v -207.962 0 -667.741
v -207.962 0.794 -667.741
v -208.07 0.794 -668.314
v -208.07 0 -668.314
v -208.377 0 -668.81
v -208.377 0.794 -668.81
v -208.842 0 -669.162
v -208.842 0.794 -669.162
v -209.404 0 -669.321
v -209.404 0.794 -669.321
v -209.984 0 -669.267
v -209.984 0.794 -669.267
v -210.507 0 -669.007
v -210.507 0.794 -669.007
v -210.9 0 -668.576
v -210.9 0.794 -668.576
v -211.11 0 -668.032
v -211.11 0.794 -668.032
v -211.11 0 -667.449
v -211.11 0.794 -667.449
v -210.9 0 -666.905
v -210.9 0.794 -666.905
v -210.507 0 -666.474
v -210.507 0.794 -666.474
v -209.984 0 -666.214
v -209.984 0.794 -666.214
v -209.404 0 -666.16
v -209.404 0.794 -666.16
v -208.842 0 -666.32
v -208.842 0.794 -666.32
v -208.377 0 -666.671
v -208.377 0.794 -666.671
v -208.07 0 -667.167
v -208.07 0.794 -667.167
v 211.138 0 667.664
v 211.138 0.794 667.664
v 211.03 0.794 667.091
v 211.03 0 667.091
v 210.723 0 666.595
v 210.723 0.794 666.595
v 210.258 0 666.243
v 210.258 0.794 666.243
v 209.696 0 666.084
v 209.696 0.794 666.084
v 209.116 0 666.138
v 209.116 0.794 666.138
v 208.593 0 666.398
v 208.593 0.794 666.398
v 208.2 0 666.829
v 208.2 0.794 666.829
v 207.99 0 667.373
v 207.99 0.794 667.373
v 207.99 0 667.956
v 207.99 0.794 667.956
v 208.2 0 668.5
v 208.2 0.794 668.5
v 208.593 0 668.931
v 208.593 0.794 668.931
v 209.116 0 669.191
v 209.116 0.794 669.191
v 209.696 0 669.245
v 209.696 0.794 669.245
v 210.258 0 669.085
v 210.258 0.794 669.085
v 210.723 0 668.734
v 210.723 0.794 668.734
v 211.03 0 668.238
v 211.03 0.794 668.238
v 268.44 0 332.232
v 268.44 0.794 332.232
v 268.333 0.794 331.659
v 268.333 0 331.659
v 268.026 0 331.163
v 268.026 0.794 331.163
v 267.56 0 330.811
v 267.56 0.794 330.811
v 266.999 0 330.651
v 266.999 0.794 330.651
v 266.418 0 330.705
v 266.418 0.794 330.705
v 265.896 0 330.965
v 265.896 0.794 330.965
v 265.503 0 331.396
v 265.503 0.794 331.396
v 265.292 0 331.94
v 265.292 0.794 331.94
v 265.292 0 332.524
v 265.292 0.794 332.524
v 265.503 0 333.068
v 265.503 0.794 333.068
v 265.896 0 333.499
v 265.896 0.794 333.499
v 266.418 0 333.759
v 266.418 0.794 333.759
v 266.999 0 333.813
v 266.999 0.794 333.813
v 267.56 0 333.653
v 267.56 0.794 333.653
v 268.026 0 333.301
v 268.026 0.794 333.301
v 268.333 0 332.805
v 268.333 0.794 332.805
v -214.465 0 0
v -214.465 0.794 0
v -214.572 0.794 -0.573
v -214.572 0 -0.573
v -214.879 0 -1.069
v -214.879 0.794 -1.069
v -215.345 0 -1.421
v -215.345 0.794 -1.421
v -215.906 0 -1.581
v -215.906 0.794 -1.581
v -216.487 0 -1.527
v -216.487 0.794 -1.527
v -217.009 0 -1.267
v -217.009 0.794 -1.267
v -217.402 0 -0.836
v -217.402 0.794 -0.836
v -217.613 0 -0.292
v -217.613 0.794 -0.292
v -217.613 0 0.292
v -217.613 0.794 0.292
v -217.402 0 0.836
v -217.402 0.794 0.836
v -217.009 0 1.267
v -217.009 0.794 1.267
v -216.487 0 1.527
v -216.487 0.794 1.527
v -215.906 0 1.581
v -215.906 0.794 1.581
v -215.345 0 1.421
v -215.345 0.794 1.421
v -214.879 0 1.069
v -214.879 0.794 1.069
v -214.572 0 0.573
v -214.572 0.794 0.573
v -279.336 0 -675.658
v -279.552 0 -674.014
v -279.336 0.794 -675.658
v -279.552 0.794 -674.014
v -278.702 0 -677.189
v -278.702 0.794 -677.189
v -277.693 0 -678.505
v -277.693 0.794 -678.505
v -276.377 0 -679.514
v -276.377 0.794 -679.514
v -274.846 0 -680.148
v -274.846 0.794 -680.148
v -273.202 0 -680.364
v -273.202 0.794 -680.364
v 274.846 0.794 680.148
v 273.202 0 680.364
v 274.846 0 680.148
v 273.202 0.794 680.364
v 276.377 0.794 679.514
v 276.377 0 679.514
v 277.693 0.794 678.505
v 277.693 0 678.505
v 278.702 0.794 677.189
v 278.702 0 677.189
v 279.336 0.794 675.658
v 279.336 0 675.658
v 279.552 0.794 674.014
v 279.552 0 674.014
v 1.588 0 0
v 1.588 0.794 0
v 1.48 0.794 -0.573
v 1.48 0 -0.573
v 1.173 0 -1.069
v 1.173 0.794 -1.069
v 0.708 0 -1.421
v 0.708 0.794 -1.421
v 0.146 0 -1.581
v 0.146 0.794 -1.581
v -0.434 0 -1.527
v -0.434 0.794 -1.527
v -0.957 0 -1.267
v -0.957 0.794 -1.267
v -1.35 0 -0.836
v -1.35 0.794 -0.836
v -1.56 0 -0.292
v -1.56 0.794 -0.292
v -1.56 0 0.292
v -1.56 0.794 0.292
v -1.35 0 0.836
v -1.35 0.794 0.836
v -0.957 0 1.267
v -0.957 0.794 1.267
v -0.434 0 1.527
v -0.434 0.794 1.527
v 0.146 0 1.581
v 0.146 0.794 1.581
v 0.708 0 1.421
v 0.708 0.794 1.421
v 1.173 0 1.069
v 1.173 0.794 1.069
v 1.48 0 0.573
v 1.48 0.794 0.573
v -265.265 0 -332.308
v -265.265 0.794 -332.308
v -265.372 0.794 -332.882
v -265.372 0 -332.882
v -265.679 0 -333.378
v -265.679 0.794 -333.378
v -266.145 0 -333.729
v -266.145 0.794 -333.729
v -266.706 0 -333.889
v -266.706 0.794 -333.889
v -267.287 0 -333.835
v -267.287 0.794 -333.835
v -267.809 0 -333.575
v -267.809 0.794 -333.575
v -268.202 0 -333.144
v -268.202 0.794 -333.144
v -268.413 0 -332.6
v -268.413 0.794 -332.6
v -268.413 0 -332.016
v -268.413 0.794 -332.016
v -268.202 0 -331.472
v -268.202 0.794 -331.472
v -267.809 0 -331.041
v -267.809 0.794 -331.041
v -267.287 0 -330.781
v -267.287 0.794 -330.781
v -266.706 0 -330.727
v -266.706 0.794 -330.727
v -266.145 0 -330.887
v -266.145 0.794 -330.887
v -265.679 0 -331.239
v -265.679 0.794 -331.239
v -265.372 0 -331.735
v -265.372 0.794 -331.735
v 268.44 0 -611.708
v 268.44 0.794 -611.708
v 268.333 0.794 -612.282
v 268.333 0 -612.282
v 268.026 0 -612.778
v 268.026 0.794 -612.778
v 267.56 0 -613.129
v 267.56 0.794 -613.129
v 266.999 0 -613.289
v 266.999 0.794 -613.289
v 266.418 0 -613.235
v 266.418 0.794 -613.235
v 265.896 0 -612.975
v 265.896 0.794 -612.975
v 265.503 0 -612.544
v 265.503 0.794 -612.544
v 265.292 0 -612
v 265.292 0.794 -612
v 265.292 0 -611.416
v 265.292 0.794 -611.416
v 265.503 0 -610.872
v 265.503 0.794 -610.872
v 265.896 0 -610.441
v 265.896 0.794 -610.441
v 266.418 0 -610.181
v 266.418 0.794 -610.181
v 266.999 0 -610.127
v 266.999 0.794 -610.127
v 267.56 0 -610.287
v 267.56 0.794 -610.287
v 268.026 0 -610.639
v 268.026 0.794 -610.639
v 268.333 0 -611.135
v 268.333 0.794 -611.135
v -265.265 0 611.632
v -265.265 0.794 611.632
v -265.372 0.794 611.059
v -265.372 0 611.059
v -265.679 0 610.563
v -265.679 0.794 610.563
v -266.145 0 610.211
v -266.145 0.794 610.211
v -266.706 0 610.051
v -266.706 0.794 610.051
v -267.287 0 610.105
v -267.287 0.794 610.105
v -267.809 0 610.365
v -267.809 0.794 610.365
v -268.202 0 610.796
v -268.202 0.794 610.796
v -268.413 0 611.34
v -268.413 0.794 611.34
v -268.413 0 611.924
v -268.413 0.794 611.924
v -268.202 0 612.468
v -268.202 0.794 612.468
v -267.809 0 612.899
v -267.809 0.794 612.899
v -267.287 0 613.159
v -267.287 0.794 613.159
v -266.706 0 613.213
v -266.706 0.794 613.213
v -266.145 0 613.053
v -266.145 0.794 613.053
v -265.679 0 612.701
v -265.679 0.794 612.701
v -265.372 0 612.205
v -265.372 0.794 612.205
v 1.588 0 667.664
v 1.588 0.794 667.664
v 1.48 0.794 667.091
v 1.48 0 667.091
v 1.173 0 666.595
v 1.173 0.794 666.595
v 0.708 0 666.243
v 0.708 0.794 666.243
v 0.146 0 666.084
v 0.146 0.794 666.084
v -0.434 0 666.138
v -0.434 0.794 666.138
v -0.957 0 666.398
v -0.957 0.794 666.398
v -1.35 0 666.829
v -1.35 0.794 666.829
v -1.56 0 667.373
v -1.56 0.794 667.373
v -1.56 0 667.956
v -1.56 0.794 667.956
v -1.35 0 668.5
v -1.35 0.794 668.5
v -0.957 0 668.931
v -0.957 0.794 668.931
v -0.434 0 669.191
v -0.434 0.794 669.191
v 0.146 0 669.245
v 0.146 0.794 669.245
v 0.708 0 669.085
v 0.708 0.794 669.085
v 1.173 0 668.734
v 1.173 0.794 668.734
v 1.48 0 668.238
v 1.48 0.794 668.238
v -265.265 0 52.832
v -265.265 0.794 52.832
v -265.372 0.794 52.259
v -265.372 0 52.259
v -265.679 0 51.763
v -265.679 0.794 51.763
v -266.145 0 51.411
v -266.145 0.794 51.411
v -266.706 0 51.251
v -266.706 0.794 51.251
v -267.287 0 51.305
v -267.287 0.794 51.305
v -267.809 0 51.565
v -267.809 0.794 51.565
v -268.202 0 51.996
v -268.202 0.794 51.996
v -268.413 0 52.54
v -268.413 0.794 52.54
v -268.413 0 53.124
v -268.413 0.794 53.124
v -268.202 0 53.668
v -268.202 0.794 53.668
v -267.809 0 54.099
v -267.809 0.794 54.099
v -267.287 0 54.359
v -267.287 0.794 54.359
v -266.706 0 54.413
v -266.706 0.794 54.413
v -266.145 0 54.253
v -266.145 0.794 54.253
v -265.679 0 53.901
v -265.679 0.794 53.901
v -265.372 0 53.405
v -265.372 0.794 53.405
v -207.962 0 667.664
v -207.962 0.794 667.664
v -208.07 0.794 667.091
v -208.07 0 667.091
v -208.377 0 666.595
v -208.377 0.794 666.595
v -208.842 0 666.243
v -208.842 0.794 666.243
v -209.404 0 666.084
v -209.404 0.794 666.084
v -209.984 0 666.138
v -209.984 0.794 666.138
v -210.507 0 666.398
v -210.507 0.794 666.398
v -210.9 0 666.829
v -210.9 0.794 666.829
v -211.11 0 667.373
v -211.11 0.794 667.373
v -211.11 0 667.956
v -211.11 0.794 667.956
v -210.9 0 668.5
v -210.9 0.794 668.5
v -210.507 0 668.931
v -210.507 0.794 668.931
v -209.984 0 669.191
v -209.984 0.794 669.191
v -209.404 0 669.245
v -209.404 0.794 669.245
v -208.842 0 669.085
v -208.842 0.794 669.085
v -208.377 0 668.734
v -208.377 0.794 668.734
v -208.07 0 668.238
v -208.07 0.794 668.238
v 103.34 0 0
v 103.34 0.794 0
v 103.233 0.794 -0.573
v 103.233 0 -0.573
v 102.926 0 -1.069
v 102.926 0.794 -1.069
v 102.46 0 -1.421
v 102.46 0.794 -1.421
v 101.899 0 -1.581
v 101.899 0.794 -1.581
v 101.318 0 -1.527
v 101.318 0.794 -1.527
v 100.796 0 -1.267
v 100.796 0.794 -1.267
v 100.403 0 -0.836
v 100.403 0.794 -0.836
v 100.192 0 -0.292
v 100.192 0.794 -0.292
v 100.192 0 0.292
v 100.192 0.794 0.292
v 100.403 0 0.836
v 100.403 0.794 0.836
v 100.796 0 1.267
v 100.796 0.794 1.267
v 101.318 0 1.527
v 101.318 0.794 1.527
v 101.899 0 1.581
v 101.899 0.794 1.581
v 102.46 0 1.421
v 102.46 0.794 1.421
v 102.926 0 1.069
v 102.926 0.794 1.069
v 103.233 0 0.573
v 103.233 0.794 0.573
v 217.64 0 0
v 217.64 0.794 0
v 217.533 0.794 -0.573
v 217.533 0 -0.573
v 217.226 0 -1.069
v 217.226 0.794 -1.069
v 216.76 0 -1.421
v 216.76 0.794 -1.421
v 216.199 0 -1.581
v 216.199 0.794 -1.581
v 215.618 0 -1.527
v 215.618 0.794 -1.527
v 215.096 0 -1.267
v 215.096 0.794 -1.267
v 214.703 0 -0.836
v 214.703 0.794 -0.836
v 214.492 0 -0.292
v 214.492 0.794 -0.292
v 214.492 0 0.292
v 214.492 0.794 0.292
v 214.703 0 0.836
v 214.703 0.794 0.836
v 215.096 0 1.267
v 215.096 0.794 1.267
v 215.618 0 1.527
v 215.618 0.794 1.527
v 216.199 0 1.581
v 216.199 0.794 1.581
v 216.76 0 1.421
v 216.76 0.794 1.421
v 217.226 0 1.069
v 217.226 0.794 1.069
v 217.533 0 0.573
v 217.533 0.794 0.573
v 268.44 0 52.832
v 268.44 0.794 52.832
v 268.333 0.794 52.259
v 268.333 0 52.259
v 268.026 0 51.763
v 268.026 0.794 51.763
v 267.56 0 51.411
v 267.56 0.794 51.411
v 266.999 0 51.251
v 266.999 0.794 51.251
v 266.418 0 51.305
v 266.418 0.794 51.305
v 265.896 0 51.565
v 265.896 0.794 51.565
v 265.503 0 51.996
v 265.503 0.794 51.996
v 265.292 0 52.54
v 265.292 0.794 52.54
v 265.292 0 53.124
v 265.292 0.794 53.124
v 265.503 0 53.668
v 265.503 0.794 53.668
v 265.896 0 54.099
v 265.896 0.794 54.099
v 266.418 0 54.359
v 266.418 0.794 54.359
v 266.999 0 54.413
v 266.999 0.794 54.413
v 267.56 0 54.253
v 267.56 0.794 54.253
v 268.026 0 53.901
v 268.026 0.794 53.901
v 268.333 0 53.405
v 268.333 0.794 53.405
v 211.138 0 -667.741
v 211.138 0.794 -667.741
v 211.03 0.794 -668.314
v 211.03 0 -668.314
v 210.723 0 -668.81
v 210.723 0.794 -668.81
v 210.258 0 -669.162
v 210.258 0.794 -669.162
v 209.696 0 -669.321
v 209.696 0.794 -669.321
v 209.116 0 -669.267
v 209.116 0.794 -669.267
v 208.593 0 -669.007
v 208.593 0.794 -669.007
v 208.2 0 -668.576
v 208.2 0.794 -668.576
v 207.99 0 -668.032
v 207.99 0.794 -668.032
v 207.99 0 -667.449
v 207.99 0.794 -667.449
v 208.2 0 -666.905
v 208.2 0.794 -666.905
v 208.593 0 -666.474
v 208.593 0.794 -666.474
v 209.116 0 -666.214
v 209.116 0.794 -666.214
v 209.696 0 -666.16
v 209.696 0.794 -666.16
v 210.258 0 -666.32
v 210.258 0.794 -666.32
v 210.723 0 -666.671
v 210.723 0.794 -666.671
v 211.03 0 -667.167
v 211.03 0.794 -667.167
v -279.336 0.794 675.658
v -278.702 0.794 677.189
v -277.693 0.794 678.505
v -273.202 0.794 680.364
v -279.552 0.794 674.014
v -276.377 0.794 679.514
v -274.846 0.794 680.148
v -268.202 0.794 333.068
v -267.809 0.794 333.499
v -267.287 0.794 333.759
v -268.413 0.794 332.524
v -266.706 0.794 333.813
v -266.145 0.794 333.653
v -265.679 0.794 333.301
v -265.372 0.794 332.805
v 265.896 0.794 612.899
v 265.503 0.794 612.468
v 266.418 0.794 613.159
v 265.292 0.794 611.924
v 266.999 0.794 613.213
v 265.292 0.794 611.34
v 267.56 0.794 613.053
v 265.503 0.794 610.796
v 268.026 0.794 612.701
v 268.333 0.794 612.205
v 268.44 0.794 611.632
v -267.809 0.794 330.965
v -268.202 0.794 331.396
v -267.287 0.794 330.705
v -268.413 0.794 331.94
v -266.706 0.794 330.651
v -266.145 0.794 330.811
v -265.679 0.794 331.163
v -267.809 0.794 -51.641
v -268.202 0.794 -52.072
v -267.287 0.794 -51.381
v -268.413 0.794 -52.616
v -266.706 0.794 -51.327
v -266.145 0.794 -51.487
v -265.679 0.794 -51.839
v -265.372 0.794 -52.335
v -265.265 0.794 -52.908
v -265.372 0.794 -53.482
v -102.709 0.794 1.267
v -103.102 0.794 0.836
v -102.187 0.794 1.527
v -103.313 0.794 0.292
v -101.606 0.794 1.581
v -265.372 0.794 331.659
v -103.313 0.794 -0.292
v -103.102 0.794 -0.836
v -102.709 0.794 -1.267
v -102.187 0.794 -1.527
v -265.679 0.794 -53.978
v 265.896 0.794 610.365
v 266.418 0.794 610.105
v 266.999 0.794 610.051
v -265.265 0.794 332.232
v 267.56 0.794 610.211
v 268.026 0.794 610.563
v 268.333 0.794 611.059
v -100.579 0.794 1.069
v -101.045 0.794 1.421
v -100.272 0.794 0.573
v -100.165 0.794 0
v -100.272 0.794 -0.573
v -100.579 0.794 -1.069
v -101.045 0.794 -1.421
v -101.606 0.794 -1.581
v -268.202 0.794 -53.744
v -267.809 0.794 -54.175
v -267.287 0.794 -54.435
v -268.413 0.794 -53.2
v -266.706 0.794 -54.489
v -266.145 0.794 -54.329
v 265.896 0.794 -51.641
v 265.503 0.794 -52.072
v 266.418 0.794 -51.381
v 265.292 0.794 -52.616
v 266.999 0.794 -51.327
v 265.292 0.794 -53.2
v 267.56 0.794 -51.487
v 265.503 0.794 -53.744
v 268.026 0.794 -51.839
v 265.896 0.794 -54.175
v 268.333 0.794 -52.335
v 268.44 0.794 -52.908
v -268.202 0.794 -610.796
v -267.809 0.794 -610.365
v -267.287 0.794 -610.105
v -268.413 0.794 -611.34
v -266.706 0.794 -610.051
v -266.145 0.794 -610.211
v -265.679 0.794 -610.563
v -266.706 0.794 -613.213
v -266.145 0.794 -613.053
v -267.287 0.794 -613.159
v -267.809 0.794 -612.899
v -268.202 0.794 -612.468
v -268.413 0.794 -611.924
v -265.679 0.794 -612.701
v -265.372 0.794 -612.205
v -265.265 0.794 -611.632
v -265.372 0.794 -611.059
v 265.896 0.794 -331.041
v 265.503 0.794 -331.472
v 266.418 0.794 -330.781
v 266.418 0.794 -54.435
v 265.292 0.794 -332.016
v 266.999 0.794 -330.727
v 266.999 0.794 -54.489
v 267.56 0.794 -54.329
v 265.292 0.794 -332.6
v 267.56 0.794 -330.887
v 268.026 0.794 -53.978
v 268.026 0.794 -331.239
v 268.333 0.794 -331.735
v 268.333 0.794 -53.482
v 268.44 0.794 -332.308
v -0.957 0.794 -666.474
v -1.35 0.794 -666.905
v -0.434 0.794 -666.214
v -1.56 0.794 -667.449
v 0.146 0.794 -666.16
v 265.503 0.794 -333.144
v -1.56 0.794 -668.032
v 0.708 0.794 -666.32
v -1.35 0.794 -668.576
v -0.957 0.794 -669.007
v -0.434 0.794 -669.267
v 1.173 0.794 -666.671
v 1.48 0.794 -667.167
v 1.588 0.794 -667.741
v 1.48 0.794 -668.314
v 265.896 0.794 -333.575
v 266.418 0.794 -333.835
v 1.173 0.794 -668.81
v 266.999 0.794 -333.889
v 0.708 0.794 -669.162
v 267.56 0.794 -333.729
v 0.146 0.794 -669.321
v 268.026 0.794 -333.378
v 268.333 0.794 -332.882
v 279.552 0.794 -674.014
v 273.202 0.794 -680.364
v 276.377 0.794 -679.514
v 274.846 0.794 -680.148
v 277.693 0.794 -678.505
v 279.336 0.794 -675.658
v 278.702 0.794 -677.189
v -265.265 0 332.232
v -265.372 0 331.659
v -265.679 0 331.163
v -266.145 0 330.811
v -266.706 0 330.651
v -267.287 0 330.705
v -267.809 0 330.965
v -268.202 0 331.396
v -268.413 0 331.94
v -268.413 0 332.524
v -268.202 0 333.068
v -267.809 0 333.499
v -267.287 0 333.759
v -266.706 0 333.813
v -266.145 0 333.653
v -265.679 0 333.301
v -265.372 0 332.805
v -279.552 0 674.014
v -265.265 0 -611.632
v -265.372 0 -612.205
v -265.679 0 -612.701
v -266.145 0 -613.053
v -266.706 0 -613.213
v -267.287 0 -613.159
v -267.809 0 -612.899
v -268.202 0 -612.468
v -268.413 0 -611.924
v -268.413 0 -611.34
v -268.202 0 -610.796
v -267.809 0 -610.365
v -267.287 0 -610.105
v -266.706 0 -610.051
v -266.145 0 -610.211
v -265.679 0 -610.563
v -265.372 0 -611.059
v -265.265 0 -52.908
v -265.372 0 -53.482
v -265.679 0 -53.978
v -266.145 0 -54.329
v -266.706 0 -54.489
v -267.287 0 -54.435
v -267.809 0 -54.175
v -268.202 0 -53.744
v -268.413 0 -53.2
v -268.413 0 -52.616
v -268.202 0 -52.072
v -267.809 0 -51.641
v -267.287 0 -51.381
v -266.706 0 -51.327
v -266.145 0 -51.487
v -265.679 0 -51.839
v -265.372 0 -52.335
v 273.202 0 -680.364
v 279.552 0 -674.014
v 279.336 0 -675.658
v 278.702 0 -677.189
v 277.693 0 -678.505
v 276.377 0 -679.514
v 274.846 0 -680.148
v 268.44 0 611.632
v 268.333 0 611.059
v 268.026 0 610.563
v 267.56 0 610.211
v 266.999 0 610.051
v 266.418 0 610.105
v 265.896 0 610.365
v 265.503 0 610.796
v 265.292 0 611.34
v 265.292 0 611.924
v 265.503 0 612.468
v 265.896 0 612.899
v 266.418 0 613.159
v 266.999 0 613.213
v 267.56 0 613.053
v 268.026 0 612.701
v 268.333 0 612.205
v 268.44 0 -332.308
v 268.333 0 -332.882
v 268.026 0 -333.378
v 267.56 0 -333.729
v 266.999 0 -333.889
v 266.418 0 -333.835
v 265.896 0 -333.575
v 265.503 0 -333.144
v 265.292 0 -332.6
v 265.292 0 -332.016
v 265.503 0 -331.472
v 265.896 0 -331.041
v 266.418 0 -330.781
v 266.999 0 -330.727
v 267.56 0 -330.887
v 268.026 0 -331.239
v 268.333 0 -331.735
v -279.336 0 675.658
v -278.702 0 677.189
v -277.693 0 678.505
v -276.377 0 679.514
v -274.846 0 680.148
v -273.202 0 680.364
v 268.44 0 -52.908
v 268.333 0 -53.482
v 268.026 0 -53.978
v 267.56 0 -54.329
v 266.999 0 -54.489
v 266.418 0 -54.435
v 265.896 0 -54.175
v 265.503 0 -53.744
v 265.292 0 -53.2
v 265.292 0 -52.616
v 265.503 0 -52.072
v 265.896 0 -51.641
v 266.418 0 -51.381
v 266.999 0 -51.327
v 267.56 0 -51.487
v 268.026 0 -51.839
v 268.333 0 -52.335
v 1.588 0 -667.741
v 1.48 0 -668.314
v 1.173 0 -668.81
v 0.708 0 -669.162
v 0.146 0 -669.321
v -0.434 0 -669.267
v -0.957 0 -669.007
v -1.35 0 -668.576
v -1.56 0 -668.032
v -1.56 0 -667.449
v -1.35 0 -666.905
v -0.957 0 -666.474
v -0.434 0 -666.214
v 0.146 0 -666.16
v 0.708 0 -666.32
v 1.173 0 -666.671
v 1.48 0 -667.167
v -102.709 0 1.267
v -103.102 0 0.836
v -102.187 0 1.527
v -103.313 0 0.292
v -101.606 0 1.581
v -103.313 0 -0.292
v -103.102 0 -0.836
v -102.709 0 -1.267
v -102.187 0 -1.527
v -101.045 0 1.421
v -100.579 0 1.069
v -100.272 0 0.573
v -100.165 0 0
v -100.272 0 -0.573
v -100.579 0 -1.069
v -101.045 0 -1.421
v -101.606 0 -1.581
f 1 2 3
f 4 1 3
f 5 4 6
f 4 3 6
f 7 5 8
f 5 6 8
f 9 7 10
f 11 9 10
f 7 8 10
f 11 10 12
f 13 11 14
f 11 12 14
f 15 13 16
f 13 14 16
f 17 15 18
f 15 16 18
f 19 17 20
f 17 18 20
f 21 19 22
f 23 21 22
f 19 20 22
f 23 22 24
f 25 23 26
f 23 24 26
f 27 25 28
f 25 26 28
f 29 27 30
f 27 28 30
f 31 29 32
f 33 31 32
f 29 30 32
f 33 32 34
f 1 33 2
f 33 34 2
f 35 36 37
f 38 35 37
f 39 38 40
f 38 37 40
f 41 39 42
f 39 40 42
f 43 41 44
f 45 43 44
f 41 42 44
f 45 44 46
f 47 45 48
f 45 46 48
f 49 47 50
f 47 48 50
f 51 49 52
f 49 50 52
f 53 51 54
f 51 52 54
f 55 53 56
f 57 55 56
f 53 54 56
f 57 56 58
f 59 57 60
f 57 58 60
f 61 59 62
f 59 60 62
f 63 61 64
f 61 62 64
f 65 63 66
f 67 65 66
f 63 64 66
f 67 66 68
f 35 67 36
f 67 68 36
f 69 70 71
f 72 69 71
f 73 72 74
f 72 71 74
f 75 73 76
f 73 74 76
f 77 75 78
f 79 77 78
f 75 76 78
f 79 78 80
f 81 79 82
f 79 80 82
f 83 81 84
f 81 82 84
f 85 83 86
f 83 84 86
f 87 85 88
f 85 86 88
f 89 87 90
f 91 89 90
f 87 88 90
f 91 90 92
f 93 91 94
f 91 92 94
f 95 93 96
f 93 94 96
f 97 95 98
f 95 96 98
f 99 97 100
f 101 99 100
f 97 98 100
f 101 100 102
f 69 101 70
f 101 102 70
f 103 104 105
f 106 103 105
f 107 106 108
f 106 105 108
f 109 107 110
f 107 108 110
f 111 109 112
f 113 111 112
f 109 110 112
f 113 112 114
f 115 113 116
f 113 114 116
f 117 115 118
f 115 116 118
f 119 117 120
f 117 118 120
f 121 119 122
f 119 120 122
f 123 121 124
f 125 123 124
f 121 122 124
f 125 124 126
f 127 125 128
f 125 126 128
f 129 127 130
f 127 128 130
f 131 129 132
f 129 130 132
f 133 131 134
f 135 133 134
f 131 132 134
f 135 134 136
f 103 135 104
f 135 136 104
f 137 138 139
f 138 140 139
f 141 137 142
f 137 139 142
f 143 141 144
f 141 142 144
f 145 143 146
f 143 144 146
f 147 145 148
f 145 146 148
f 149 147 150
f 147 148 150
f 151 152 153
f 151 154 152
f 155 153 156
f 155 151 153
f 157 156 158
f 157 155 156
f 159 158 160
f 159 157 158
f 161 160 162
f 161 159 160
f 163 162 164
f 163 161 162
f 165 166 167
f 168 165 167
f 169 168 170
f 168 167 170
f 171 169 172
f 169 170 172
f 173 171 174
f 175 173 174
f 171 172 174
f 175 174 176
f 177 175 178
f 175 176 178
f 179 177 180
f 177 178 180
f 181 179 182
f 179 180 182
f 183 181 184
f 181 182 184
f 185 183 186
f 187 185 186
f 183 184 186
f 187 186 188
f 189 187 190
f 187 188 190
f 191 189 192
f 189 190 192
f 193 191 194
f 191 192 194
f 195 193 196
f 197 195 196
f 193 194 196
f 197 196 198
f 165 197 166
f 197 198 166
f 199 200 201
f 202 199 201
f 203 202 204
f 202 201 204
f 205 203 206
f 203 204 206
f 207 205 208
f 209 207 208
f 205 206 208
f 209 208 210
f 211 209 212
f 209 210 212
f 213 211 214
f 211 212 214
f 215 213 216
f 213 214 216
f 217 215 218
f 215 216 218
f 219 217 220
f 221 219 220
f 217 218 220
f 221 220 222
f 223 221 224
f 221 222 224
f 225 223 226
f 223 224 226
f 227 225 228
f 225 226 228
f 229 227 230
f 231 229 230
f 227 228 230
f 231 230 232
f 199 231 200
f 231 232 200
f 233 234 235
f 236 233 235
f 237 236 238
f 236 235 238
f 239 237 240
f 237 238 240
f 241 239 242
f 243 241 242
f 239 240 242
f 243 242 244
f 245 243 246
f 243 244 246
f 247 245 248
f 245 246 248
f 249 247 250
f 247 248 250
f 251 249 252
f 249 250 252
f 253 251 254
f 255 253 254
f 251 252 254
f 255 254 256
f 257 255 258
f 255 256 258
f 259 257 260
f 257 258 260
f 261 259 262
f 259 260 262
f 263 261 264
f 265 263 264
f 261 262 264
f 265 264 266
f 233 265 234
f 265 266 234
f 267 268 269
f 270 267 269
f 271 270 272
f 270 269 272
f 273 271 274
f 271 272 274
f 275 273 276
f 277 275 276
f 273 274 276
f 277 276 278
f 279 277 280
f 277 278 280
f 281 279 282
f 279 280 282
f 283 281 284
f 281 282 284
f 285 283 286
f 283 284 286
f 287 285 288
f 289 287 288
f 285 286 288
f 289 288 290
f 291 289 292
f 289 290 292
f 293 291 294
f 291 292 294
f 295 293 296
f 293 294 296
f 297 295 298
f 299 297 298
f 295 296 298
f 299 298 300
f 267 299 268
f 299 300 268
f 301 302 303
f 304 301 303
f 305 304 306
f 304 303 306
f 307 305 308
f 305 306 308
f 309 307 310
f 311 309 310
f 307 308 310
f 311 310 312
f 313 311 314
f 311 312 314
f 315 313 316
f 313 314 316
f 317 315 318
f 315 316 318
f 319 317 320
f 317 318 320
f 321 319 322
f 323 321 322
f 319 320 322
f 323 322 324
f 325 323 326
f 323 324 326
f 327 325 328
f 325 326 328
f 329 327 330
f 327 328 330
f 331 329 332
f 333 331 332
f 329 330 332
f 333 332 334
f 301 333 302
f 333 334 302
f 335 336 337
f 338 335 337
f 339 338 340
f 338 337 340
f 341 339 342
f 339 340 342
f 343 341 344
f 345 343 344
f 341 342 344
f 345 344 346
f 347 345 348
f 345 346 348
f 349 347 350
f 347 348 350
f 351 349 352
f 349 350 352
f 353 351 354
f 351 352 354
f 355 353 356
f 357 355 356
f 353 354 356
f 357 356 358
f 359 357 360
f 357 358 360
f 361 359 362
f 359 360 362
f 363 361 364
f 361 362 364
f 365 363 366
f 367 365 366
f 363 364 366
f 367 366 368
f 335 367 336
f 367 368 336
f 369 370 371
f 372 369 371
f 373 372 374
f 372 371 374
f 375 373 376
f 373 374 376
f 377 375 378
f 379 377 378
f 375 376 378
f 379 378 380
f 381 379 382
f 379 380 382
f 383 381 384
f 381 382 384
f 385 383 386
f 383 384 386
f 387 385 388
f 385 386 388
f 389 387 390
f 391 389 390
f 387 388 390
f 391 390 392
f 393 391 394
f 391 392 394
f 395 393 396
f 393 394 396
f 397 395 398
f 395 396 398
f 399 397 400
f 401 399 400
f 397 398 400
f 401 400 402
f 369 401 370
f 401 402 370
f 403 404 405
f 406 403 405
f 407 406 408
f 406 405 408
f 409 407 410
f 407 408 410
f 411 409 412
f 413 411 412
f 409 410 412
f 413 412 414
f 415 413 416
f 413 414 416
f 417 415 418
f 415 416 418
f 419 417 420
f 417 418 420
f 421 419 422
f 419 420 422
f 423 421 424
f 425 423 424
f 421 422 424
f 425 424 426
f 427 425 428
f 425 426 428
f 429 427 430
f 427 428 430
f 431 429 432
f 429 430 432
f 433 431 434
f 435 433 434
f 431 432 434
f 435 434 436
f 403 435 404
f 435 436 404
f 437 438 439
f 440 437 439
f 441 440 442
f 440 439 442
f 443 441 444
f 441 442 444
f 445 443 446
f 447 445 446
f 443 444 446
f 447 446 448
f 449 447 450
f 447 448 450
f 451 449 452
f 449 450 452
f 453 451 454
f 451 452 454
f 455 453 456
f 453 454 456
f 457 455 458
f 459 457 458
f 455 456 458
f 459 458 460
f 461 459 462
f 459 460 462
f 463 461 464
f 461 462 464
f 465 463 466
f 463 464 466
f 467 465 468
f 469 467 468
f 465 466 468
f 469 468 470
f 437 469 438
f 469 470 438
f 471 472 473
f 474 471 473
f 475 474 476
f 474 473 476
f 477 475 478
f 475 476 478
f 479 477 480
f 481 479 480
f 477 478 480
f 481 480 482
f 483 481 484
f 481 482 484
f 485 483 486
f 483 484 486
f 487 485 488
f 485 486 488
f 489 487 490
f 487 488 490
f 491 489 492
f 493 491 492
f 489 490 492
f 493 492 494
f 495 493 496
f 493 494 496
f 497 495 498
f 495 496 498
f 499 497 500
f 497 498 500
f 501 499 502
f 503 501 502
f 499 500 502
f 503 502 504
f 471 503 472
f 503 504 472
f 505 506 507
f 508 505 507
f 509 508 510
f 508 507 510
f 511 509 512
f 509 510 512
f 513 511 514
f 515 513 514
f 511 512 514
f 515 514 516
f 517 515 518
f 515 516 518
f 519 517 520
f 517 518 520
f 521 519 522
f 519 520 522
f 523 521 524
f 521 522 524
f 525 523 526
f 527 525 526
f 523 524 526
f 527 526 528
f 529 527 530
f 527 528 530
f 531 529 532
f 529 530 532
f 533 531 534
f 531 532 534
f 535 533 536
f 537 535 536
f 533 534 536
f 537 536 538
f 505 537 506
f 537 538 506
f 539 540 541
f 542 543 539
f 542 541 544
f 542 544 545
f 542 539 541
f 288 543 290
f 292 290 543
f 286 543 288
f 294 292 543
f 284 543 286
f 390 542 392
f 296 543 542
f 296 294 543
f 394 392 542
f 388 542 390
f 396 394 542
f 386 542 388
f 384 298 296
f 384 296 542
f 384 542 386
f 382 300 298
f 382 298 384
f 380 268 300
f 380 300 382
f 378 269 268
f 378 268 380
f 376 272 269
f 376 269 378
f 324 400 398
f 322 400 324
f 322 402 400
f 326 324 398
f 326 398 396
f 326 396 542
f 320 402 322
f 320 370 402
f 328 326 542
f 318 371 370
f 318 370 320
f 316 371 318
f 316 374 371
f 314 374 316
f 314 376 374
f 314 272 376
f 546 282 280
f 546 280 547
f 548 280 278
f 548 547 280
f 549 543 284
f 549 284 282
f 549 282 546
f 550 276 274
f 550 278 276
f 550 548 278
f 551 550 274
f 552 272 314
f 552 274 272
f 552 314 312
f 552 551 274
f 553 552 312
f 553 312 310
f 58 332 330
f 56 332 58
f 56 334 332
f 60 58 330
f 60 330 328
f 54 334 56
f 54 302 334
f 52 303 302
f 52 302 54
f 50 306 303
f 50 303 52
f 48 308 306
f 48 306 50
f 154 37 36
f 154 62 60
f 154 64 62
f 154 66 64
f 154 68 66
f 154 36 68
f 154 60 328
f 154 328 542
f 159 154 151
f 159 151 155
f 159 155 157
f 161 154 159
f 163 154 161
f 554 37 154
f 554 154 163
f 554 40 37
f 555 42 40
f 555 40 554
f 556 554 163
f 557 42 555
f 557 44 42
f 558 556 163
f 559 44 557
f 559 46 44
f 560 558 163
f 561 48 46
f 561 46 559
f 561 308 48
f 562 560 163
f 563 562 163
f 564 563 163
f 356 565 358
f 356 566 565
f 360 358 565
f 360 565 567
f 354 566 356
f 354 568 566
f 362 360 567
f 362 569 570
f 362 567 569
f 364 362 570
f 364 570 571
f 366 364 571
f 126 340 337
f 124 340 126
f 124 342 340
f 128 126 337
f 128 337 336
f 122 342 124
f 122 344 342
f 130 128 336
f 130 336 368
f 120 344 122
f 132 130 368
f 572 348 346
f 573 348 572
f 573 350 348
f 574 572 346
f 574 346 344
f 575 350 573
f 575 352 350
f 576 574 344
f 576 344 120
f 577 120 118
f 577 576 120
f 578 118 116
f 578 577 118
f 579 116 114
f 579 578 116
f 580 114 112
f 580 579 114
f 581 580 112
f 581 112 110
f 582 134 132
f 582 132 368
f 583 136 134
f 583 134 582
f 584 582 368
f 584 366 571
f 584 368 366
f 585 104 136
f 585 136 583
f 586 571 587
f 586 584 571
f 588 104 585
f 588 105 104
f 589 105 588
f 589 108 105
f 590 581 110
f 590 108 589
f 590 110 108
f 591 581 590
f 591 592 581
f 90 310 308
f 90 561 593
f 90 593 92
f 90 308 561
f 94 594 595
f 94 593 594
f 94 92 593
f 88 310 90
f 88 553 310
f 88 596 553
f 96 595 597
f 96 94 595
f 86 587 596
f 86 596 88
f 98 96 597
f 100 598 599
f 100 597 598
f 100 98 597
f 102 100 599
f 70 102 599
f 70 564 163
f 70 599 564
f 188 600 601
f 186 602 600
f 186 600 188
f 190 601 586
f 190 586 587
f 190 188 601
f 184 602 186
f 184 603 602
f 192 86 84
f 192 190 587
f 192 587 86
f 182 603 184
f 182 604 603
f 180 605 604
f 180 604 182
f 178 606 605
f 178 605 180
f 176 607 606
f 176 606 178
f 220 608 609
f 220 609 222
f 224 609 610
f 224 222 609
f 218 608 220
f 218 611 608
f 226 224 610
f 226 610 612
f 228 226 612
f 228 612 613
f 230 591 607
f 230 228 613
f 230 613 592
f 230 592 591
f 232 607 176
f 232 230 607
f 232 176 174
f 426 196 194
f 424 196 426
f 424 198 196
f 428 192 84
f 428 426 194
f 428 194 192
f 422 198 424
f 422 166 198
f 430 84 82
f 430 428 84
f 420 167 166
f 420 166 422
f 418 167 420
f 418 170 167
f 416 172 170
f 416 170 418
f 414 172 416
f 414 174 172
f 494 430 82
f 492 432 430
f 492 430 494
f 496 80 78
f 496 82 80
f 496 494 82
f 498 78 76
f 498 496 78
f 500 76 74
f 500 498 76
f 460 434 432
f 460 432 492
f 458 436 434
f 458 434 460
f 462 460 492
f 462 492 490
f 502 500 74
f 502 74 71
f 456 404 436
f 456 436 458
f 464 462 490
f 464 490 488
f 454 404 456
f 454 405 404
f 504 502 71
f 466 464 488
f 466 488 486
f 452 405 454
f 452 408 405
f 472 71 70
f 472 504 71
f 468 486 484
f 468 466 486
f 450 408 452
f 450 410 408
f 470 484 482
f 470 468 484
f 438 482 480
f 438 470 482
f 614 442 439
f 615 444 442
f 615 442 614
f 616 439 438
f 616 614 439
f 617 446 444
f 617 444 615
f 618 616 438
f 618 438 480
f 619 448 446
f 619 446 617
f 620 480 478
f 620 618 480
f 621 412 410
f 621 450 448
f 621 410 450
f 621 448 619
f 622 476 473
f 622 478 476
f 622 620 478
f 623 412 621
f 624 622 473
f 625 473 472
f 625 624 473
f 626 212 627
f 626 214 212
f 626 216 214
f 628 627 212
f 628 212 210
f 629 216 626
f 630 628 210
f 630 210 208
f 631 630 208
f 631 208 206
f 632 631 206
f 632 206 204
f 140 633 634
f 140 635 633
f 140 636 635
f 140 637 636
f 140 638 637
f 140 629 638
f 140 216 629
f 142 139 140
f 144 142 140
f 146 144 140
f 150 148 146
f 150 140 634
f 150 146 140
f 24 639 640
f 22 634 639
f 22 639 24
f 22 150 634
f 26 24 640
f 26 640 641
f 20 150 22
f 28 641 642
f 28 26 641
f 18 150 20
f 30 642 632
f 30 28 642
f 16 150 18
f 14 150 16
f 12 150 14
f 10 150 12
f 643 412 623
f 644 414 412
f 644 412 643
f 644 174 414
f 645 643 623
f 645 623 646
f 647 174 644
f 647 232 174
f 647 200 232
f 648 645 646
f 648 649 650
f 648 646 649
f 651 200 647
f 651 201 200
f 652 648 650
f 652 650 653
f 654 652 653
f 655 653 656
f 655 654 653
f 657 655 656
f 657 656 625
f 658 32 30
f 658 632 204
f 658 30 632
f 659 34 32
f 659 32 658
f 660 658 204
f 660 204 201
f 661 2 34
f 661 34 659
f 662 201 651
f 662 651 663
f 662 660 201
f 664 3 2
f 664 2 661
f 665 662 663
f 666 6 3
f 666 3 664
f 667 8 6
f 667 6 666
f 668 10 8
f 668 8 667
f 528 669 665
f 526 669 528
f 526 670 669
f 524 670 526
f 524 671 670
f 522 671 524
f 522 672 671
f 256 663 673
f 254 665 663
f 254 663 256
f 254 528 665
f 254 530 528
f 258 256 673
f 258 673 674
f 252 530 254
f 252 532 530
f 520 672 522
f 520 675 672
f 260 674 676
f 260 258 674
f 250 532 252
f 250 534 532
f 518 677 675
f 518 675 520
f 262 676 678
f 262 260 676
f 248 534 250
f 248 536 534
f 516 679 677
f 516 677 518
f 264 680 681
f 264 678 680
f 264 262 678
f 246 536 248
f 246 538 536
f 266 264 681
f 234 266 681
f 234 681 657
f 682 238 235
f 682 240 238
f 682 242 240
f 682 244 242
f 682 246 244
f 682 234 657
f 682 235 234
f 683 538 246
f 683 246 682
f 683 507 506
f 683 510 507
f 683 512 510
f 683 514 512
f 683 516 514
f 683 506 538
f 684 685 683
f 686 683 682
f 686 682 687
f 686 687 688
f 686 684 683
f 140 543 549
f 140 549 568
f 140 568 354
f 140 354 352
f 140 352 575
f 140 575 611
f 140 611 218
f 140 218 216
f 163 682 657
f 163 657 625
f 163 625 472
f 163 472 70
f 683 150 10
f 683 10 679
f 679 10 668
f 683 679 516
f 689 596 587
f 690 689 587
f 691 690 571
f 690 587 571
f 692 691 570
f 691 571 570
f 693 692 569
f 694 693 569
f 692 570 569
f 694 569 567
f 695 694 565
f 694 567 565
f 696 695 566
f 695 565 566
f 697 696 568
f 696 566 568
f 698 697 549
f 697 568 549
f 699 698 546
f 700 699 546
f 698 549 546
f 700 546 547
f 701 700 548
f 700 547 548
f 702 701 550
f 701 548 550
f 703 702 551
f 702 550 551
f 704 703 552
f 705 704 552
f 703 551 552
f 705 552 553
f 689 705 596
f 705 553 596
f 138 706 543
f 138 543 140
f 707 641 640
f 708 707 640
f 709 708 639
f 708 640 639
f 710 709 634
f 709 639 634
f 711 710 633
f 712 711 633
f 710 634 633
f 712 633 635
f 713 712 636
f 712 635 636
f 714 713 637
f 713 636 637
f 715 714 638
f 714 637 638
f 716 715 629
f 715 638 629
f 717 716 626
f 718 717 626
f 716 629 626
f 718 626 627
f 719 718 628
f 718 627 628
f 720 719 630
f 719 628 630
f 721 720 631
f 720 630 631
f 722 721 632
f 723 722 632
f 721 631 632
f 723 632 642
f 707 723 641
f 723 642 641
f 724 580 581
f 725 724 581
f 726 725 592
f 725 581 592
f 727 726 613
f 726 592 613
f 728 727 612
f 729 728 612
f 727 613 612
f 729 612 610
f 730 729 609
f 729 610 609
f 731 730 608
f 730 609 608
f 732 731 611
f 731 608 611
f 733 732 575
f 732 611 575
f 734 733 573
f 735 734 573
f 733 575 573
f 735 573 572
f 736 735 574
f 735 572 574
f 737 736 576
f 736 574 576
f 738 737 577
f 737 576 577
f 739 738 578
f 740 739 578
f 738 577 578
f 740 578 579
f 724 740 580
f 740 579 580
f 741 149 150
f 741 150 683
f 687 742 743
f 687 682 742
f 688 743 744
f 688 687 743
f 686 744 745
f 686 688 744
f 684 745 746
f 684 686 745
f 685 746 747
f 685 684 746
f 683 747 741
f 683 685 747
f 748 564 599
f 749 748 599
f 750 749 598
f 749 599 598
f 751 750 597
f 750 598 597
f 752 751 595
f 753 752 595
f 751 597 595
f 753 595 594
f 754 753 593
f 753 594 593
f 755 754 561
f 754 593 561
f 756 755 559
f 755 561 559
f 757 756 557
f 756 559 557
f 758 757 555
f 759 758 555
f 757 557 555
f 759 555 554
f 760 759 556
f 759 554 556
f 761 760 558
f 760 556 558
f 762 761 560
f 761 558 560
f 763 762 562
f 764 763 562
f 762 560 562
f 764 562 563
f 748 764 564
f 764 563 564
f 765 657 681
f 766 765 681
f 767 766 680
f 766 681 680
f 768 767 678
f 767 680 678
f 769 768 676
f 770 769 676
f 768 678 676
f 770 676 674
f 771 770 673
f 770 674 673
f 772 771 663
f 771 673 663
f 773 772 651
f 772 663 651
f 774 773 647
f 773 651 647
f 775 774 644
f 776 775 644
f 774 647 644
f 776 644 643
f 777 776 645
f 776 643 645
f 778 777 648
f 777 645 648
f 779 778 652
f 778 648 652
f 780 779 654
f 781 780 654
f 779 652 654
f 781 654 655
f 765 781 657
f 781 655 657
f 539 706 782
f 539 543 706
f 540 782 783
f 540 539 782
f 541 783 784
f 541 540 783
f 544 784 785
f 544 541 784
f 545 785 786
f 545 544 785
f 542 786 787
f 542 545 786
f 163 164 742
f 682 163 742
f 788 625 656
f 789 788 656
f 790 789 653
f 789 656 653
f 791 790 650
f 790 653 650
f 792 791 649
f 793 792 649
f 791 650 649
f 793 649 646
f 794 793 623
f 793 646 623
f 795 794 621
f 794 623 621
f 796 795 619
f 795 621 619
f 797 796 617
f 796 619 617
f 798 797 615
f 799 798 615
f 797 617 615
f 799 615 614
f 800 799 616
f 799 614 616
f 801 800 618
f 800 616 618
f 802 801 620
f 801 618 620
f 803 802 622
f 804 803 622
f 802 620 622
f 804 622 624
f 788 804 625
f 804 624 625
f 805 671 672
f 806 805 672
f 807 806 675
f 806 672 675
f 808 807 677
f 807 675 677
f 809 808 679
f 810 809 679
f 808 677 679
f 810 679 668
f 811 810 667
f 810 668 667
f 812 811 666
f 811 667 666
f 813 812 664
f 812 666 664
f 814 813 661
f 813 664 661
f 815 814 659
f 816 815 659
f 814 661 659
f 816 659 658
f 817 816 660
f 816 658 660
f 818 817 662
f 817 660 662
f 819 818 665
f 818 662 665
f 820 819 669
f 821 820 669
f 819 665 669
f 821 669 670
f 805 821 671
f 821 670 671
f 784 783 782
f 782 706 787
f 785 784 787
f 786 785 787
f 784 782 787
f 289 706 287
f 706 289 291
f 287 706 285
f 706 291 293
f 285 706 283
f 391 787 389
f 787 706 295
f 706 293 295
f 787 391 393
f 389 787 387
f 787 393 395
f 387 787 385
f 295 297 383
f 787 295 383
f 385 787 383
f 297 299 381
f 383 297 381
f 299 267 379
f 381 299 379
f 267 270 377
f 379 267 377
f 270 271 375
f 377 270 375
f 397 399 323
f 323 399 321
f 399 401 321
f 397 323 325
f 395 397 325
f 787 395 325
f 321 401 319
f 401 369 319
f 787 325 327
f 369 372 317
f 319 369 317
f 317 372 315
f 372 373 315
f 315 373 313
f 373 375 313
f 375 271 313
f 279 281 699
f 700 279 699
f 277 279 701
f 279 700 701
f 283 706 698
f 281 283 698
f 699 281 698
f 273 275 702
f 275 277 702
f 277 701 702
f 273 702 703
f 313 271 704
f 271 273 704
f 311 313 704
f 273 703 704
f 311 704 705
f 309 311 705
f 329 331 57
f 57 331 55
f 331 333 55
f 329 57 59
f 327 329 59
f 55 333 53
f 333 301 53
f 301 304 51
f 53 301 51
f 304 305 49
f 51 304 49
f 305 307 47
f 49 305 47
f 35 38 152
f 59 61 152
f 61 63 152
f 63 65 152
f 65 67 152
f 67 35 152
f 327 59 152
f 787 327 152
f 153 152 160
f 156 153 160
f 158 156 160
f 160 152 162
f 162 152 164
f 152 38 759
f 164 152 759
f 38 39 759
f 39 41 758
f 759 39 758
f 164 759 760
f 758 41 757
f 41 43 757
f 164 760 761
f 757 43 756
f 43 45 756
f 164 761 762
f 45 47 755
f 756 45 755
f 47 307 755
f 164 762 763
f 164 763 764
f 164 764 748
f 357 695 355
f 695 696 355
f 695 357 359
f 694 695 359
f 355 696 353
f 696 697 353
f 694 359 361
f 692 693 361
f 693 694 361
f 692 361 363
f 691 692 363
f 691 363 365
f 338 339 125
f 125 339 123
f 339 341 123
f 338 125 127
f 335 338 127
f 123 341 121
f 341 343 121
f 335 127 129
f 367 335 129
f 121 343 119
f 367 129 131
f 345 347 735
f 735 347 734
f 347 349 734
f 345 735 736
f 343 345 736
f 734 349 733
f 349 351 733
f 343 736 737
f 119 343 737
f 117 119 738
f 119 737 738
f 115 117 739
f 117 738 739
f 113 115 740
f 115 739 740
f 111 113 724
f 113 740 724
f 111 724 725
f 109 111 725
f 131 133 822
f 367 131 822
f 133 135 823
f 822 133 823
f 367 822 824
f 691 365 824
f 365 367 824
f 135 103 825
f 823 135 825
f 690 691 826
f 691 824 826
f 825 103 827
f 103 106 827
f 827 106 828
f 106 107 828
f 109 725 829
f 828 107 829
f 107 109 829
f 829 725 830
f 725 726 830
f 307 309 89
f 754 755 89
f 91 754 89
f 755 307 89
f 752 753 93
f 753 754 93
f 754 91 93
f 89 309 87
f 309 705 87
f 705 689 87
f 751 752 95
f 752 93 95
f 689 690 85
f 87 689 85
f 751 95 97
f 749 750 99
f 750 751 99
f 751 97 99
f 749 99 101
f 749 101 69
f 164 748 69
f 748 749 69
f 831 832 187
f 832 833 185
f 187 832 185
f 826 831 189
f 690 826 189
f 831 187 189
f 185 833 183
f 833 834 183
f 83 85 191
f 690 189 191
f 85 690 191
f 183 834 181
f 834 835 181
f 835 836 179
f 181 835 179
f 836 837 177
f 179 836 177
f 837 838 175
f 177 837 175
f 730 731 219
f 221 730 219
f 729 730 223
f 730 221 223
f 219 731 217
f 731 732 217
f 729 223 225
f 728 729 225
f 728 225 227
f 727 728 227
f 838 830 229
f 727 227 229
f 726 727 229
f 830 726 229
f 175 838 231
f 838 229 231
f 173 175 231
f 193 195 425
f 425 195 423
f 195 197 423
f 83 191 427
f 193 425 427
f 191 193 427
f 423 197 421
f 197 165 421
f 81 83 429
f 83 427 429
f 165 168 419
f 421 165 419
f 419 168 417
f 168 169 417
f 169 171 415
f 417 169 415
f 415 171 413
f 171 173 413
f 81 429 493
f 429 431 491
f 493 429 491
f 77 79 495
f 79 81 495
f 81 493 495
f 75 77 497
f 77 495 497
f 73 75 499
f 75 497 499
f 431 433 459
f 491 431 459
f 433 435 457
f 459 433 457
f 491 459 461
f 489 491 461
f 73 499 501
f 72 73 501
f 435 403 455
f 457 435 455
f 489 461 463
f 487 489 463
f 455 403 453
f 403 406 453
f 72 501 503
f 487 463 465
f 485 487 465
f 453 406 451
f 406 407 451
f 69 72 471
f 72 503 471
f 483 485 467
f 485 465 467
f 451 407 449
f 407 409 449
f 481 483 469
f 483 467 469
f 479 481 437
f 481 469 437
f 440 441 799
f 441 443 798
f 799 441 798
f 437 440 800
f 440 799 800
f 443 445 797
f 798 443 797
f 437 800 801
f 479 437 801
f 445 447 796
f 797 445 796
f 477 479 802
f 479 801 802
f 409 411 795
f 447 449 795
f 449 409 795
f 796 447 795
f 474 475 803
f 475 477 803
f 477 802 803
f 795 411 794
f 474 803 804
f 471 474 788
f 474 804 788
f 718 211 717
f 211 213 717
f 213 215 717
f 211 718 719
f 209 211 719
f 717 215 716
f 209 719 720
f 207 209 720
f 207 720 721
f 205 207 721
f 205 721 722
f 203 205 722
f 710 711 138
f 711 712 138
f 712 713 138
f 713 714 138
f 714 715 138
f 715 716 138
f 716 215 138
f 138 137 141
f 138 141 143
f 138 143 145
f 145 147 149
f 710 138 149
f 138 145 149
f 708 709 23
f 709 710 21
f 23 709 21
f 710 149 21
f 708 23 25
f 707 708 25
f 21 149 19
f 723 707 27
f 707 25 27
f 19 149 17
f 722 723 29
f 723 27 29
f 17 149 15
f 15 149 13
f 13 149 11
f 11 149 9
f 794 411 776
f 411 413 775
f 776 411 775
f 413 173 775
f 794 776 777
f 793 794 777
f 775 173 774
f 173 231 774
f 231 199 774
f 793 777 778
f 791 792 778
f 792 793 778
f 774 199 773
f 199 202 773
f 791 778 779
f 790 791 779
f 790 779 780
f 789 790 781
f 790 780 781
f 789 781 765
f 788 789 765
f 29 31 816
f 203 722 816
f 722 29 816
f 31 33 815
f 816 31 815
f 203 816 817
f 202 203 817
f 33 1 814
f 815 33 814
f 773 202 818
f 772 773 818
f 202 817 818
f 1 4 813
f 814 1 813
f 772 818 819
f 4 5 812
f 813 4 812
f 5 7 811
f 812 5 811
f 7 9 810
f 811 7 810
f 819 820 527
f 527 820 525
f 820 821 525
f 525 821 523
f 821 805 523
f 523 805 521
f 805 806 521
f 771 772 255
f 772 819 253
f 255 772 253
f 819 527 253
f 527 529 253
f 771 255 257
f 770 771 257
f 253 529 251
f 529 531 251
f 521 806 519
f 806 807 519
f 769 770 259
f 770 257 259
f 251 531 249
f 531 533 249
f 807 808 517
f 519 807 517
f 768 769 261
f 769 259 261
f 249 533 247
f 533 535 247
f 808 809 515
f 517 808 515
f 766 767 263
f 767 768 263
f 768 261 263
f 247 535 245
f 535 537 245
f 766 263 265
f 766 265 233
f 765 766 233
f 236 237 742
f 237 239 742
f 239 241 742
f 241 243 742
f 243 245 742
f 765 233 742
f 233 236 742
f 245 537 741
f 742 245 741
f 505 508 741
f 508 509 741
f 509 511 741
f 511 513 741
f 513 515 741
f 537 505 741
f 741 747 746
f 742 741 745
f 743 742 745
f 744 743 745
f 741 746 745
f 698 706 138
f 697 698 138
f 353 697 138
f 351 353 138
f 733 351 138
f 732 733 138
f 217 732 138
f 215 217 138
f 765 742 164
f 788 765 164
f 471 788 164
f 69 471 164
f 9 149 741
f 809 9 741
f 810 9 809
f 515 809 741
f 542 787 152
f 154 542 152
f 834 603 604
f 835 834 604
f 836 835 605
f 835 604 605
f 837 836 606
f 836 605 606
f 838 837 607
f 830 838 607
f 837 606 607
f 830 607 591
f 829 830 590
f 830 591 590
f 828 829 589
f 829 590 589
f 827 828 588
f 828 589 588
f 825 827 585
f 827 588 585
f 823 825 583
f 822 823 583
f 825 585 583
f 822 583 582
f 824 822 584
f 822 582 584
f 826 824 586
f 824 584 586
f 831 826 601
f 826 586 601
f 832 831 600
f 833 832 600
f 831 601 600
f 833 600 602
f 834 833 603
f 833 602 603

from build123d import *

# Parameters (mm, degrees)
SKETCH1_W                    = 559.1048
SKETCH1_H                    = 1360.7288
BOSS_EXTRUDE1_DEPTH          = 0.79375
FILLET1_R                    = 6.35
F_1_8_0_125_DIAMETER_HOLE1_D = 3.175


with BuildPart() as part:
    # Sketch1 → Boss-Extrude1 (new body)
    with BuildSketch(Plane(origin=(0, 0, 0), x_dir=(1, 0, 0), z_dir=(0, 1, 0))):
        Rectangle(SKETCH1_W, SKETCH1_H)
    extrude(amount=BOSS_EXTRUDE1_DEPTH)

    # Fillet1
    fillet1_edges = [part.edges().sort_by_distance(p)[0] for p in [
        (279.5524, 0.396875, 680.3644),
        (-279.5524, 0.396875, 680.3644),
        (-279.5524, 0.396875, -680.3644),
        (279.5524, 0.396875, -680.3644),
    ]]
    fillet(fillet1_edges, radius=FILLET1_R)

    # 1/8 (0.125) Diameter Hole1 (through all)
    with Locations(Plane(origin=(0, 0, 0), x_dir=(-1, 0, 0), z_dir=(0, -1, 0))):
        with Locations((-266.8524, -611.632), (-209.55, -667.6644), (-266.8524, -332.232), (0, -667.6644), (209.55, -667.6644), (266.8524, -611.632), (266.8524, -332.232), (266.8524, -52.832), (266.8524, 52.9082), (-266.8524, -52.832), (-266.8524, 52.9082), (-266.8524, 332.3082), (-266.8524, 611.7082), (-209.55, 667.7406), (0, 667.7406), (266.8524, 332.3082), (266.8524, 611.632), (209.55, 667.7406), (-216.0524, 0), (-101.7524, 0), (0, 0), (101.7524, 0), (216.0524, 0)):
            Hole(F_1_8_0_125_DIAMETER_HOLE1_D / 2)


solid = part.part
